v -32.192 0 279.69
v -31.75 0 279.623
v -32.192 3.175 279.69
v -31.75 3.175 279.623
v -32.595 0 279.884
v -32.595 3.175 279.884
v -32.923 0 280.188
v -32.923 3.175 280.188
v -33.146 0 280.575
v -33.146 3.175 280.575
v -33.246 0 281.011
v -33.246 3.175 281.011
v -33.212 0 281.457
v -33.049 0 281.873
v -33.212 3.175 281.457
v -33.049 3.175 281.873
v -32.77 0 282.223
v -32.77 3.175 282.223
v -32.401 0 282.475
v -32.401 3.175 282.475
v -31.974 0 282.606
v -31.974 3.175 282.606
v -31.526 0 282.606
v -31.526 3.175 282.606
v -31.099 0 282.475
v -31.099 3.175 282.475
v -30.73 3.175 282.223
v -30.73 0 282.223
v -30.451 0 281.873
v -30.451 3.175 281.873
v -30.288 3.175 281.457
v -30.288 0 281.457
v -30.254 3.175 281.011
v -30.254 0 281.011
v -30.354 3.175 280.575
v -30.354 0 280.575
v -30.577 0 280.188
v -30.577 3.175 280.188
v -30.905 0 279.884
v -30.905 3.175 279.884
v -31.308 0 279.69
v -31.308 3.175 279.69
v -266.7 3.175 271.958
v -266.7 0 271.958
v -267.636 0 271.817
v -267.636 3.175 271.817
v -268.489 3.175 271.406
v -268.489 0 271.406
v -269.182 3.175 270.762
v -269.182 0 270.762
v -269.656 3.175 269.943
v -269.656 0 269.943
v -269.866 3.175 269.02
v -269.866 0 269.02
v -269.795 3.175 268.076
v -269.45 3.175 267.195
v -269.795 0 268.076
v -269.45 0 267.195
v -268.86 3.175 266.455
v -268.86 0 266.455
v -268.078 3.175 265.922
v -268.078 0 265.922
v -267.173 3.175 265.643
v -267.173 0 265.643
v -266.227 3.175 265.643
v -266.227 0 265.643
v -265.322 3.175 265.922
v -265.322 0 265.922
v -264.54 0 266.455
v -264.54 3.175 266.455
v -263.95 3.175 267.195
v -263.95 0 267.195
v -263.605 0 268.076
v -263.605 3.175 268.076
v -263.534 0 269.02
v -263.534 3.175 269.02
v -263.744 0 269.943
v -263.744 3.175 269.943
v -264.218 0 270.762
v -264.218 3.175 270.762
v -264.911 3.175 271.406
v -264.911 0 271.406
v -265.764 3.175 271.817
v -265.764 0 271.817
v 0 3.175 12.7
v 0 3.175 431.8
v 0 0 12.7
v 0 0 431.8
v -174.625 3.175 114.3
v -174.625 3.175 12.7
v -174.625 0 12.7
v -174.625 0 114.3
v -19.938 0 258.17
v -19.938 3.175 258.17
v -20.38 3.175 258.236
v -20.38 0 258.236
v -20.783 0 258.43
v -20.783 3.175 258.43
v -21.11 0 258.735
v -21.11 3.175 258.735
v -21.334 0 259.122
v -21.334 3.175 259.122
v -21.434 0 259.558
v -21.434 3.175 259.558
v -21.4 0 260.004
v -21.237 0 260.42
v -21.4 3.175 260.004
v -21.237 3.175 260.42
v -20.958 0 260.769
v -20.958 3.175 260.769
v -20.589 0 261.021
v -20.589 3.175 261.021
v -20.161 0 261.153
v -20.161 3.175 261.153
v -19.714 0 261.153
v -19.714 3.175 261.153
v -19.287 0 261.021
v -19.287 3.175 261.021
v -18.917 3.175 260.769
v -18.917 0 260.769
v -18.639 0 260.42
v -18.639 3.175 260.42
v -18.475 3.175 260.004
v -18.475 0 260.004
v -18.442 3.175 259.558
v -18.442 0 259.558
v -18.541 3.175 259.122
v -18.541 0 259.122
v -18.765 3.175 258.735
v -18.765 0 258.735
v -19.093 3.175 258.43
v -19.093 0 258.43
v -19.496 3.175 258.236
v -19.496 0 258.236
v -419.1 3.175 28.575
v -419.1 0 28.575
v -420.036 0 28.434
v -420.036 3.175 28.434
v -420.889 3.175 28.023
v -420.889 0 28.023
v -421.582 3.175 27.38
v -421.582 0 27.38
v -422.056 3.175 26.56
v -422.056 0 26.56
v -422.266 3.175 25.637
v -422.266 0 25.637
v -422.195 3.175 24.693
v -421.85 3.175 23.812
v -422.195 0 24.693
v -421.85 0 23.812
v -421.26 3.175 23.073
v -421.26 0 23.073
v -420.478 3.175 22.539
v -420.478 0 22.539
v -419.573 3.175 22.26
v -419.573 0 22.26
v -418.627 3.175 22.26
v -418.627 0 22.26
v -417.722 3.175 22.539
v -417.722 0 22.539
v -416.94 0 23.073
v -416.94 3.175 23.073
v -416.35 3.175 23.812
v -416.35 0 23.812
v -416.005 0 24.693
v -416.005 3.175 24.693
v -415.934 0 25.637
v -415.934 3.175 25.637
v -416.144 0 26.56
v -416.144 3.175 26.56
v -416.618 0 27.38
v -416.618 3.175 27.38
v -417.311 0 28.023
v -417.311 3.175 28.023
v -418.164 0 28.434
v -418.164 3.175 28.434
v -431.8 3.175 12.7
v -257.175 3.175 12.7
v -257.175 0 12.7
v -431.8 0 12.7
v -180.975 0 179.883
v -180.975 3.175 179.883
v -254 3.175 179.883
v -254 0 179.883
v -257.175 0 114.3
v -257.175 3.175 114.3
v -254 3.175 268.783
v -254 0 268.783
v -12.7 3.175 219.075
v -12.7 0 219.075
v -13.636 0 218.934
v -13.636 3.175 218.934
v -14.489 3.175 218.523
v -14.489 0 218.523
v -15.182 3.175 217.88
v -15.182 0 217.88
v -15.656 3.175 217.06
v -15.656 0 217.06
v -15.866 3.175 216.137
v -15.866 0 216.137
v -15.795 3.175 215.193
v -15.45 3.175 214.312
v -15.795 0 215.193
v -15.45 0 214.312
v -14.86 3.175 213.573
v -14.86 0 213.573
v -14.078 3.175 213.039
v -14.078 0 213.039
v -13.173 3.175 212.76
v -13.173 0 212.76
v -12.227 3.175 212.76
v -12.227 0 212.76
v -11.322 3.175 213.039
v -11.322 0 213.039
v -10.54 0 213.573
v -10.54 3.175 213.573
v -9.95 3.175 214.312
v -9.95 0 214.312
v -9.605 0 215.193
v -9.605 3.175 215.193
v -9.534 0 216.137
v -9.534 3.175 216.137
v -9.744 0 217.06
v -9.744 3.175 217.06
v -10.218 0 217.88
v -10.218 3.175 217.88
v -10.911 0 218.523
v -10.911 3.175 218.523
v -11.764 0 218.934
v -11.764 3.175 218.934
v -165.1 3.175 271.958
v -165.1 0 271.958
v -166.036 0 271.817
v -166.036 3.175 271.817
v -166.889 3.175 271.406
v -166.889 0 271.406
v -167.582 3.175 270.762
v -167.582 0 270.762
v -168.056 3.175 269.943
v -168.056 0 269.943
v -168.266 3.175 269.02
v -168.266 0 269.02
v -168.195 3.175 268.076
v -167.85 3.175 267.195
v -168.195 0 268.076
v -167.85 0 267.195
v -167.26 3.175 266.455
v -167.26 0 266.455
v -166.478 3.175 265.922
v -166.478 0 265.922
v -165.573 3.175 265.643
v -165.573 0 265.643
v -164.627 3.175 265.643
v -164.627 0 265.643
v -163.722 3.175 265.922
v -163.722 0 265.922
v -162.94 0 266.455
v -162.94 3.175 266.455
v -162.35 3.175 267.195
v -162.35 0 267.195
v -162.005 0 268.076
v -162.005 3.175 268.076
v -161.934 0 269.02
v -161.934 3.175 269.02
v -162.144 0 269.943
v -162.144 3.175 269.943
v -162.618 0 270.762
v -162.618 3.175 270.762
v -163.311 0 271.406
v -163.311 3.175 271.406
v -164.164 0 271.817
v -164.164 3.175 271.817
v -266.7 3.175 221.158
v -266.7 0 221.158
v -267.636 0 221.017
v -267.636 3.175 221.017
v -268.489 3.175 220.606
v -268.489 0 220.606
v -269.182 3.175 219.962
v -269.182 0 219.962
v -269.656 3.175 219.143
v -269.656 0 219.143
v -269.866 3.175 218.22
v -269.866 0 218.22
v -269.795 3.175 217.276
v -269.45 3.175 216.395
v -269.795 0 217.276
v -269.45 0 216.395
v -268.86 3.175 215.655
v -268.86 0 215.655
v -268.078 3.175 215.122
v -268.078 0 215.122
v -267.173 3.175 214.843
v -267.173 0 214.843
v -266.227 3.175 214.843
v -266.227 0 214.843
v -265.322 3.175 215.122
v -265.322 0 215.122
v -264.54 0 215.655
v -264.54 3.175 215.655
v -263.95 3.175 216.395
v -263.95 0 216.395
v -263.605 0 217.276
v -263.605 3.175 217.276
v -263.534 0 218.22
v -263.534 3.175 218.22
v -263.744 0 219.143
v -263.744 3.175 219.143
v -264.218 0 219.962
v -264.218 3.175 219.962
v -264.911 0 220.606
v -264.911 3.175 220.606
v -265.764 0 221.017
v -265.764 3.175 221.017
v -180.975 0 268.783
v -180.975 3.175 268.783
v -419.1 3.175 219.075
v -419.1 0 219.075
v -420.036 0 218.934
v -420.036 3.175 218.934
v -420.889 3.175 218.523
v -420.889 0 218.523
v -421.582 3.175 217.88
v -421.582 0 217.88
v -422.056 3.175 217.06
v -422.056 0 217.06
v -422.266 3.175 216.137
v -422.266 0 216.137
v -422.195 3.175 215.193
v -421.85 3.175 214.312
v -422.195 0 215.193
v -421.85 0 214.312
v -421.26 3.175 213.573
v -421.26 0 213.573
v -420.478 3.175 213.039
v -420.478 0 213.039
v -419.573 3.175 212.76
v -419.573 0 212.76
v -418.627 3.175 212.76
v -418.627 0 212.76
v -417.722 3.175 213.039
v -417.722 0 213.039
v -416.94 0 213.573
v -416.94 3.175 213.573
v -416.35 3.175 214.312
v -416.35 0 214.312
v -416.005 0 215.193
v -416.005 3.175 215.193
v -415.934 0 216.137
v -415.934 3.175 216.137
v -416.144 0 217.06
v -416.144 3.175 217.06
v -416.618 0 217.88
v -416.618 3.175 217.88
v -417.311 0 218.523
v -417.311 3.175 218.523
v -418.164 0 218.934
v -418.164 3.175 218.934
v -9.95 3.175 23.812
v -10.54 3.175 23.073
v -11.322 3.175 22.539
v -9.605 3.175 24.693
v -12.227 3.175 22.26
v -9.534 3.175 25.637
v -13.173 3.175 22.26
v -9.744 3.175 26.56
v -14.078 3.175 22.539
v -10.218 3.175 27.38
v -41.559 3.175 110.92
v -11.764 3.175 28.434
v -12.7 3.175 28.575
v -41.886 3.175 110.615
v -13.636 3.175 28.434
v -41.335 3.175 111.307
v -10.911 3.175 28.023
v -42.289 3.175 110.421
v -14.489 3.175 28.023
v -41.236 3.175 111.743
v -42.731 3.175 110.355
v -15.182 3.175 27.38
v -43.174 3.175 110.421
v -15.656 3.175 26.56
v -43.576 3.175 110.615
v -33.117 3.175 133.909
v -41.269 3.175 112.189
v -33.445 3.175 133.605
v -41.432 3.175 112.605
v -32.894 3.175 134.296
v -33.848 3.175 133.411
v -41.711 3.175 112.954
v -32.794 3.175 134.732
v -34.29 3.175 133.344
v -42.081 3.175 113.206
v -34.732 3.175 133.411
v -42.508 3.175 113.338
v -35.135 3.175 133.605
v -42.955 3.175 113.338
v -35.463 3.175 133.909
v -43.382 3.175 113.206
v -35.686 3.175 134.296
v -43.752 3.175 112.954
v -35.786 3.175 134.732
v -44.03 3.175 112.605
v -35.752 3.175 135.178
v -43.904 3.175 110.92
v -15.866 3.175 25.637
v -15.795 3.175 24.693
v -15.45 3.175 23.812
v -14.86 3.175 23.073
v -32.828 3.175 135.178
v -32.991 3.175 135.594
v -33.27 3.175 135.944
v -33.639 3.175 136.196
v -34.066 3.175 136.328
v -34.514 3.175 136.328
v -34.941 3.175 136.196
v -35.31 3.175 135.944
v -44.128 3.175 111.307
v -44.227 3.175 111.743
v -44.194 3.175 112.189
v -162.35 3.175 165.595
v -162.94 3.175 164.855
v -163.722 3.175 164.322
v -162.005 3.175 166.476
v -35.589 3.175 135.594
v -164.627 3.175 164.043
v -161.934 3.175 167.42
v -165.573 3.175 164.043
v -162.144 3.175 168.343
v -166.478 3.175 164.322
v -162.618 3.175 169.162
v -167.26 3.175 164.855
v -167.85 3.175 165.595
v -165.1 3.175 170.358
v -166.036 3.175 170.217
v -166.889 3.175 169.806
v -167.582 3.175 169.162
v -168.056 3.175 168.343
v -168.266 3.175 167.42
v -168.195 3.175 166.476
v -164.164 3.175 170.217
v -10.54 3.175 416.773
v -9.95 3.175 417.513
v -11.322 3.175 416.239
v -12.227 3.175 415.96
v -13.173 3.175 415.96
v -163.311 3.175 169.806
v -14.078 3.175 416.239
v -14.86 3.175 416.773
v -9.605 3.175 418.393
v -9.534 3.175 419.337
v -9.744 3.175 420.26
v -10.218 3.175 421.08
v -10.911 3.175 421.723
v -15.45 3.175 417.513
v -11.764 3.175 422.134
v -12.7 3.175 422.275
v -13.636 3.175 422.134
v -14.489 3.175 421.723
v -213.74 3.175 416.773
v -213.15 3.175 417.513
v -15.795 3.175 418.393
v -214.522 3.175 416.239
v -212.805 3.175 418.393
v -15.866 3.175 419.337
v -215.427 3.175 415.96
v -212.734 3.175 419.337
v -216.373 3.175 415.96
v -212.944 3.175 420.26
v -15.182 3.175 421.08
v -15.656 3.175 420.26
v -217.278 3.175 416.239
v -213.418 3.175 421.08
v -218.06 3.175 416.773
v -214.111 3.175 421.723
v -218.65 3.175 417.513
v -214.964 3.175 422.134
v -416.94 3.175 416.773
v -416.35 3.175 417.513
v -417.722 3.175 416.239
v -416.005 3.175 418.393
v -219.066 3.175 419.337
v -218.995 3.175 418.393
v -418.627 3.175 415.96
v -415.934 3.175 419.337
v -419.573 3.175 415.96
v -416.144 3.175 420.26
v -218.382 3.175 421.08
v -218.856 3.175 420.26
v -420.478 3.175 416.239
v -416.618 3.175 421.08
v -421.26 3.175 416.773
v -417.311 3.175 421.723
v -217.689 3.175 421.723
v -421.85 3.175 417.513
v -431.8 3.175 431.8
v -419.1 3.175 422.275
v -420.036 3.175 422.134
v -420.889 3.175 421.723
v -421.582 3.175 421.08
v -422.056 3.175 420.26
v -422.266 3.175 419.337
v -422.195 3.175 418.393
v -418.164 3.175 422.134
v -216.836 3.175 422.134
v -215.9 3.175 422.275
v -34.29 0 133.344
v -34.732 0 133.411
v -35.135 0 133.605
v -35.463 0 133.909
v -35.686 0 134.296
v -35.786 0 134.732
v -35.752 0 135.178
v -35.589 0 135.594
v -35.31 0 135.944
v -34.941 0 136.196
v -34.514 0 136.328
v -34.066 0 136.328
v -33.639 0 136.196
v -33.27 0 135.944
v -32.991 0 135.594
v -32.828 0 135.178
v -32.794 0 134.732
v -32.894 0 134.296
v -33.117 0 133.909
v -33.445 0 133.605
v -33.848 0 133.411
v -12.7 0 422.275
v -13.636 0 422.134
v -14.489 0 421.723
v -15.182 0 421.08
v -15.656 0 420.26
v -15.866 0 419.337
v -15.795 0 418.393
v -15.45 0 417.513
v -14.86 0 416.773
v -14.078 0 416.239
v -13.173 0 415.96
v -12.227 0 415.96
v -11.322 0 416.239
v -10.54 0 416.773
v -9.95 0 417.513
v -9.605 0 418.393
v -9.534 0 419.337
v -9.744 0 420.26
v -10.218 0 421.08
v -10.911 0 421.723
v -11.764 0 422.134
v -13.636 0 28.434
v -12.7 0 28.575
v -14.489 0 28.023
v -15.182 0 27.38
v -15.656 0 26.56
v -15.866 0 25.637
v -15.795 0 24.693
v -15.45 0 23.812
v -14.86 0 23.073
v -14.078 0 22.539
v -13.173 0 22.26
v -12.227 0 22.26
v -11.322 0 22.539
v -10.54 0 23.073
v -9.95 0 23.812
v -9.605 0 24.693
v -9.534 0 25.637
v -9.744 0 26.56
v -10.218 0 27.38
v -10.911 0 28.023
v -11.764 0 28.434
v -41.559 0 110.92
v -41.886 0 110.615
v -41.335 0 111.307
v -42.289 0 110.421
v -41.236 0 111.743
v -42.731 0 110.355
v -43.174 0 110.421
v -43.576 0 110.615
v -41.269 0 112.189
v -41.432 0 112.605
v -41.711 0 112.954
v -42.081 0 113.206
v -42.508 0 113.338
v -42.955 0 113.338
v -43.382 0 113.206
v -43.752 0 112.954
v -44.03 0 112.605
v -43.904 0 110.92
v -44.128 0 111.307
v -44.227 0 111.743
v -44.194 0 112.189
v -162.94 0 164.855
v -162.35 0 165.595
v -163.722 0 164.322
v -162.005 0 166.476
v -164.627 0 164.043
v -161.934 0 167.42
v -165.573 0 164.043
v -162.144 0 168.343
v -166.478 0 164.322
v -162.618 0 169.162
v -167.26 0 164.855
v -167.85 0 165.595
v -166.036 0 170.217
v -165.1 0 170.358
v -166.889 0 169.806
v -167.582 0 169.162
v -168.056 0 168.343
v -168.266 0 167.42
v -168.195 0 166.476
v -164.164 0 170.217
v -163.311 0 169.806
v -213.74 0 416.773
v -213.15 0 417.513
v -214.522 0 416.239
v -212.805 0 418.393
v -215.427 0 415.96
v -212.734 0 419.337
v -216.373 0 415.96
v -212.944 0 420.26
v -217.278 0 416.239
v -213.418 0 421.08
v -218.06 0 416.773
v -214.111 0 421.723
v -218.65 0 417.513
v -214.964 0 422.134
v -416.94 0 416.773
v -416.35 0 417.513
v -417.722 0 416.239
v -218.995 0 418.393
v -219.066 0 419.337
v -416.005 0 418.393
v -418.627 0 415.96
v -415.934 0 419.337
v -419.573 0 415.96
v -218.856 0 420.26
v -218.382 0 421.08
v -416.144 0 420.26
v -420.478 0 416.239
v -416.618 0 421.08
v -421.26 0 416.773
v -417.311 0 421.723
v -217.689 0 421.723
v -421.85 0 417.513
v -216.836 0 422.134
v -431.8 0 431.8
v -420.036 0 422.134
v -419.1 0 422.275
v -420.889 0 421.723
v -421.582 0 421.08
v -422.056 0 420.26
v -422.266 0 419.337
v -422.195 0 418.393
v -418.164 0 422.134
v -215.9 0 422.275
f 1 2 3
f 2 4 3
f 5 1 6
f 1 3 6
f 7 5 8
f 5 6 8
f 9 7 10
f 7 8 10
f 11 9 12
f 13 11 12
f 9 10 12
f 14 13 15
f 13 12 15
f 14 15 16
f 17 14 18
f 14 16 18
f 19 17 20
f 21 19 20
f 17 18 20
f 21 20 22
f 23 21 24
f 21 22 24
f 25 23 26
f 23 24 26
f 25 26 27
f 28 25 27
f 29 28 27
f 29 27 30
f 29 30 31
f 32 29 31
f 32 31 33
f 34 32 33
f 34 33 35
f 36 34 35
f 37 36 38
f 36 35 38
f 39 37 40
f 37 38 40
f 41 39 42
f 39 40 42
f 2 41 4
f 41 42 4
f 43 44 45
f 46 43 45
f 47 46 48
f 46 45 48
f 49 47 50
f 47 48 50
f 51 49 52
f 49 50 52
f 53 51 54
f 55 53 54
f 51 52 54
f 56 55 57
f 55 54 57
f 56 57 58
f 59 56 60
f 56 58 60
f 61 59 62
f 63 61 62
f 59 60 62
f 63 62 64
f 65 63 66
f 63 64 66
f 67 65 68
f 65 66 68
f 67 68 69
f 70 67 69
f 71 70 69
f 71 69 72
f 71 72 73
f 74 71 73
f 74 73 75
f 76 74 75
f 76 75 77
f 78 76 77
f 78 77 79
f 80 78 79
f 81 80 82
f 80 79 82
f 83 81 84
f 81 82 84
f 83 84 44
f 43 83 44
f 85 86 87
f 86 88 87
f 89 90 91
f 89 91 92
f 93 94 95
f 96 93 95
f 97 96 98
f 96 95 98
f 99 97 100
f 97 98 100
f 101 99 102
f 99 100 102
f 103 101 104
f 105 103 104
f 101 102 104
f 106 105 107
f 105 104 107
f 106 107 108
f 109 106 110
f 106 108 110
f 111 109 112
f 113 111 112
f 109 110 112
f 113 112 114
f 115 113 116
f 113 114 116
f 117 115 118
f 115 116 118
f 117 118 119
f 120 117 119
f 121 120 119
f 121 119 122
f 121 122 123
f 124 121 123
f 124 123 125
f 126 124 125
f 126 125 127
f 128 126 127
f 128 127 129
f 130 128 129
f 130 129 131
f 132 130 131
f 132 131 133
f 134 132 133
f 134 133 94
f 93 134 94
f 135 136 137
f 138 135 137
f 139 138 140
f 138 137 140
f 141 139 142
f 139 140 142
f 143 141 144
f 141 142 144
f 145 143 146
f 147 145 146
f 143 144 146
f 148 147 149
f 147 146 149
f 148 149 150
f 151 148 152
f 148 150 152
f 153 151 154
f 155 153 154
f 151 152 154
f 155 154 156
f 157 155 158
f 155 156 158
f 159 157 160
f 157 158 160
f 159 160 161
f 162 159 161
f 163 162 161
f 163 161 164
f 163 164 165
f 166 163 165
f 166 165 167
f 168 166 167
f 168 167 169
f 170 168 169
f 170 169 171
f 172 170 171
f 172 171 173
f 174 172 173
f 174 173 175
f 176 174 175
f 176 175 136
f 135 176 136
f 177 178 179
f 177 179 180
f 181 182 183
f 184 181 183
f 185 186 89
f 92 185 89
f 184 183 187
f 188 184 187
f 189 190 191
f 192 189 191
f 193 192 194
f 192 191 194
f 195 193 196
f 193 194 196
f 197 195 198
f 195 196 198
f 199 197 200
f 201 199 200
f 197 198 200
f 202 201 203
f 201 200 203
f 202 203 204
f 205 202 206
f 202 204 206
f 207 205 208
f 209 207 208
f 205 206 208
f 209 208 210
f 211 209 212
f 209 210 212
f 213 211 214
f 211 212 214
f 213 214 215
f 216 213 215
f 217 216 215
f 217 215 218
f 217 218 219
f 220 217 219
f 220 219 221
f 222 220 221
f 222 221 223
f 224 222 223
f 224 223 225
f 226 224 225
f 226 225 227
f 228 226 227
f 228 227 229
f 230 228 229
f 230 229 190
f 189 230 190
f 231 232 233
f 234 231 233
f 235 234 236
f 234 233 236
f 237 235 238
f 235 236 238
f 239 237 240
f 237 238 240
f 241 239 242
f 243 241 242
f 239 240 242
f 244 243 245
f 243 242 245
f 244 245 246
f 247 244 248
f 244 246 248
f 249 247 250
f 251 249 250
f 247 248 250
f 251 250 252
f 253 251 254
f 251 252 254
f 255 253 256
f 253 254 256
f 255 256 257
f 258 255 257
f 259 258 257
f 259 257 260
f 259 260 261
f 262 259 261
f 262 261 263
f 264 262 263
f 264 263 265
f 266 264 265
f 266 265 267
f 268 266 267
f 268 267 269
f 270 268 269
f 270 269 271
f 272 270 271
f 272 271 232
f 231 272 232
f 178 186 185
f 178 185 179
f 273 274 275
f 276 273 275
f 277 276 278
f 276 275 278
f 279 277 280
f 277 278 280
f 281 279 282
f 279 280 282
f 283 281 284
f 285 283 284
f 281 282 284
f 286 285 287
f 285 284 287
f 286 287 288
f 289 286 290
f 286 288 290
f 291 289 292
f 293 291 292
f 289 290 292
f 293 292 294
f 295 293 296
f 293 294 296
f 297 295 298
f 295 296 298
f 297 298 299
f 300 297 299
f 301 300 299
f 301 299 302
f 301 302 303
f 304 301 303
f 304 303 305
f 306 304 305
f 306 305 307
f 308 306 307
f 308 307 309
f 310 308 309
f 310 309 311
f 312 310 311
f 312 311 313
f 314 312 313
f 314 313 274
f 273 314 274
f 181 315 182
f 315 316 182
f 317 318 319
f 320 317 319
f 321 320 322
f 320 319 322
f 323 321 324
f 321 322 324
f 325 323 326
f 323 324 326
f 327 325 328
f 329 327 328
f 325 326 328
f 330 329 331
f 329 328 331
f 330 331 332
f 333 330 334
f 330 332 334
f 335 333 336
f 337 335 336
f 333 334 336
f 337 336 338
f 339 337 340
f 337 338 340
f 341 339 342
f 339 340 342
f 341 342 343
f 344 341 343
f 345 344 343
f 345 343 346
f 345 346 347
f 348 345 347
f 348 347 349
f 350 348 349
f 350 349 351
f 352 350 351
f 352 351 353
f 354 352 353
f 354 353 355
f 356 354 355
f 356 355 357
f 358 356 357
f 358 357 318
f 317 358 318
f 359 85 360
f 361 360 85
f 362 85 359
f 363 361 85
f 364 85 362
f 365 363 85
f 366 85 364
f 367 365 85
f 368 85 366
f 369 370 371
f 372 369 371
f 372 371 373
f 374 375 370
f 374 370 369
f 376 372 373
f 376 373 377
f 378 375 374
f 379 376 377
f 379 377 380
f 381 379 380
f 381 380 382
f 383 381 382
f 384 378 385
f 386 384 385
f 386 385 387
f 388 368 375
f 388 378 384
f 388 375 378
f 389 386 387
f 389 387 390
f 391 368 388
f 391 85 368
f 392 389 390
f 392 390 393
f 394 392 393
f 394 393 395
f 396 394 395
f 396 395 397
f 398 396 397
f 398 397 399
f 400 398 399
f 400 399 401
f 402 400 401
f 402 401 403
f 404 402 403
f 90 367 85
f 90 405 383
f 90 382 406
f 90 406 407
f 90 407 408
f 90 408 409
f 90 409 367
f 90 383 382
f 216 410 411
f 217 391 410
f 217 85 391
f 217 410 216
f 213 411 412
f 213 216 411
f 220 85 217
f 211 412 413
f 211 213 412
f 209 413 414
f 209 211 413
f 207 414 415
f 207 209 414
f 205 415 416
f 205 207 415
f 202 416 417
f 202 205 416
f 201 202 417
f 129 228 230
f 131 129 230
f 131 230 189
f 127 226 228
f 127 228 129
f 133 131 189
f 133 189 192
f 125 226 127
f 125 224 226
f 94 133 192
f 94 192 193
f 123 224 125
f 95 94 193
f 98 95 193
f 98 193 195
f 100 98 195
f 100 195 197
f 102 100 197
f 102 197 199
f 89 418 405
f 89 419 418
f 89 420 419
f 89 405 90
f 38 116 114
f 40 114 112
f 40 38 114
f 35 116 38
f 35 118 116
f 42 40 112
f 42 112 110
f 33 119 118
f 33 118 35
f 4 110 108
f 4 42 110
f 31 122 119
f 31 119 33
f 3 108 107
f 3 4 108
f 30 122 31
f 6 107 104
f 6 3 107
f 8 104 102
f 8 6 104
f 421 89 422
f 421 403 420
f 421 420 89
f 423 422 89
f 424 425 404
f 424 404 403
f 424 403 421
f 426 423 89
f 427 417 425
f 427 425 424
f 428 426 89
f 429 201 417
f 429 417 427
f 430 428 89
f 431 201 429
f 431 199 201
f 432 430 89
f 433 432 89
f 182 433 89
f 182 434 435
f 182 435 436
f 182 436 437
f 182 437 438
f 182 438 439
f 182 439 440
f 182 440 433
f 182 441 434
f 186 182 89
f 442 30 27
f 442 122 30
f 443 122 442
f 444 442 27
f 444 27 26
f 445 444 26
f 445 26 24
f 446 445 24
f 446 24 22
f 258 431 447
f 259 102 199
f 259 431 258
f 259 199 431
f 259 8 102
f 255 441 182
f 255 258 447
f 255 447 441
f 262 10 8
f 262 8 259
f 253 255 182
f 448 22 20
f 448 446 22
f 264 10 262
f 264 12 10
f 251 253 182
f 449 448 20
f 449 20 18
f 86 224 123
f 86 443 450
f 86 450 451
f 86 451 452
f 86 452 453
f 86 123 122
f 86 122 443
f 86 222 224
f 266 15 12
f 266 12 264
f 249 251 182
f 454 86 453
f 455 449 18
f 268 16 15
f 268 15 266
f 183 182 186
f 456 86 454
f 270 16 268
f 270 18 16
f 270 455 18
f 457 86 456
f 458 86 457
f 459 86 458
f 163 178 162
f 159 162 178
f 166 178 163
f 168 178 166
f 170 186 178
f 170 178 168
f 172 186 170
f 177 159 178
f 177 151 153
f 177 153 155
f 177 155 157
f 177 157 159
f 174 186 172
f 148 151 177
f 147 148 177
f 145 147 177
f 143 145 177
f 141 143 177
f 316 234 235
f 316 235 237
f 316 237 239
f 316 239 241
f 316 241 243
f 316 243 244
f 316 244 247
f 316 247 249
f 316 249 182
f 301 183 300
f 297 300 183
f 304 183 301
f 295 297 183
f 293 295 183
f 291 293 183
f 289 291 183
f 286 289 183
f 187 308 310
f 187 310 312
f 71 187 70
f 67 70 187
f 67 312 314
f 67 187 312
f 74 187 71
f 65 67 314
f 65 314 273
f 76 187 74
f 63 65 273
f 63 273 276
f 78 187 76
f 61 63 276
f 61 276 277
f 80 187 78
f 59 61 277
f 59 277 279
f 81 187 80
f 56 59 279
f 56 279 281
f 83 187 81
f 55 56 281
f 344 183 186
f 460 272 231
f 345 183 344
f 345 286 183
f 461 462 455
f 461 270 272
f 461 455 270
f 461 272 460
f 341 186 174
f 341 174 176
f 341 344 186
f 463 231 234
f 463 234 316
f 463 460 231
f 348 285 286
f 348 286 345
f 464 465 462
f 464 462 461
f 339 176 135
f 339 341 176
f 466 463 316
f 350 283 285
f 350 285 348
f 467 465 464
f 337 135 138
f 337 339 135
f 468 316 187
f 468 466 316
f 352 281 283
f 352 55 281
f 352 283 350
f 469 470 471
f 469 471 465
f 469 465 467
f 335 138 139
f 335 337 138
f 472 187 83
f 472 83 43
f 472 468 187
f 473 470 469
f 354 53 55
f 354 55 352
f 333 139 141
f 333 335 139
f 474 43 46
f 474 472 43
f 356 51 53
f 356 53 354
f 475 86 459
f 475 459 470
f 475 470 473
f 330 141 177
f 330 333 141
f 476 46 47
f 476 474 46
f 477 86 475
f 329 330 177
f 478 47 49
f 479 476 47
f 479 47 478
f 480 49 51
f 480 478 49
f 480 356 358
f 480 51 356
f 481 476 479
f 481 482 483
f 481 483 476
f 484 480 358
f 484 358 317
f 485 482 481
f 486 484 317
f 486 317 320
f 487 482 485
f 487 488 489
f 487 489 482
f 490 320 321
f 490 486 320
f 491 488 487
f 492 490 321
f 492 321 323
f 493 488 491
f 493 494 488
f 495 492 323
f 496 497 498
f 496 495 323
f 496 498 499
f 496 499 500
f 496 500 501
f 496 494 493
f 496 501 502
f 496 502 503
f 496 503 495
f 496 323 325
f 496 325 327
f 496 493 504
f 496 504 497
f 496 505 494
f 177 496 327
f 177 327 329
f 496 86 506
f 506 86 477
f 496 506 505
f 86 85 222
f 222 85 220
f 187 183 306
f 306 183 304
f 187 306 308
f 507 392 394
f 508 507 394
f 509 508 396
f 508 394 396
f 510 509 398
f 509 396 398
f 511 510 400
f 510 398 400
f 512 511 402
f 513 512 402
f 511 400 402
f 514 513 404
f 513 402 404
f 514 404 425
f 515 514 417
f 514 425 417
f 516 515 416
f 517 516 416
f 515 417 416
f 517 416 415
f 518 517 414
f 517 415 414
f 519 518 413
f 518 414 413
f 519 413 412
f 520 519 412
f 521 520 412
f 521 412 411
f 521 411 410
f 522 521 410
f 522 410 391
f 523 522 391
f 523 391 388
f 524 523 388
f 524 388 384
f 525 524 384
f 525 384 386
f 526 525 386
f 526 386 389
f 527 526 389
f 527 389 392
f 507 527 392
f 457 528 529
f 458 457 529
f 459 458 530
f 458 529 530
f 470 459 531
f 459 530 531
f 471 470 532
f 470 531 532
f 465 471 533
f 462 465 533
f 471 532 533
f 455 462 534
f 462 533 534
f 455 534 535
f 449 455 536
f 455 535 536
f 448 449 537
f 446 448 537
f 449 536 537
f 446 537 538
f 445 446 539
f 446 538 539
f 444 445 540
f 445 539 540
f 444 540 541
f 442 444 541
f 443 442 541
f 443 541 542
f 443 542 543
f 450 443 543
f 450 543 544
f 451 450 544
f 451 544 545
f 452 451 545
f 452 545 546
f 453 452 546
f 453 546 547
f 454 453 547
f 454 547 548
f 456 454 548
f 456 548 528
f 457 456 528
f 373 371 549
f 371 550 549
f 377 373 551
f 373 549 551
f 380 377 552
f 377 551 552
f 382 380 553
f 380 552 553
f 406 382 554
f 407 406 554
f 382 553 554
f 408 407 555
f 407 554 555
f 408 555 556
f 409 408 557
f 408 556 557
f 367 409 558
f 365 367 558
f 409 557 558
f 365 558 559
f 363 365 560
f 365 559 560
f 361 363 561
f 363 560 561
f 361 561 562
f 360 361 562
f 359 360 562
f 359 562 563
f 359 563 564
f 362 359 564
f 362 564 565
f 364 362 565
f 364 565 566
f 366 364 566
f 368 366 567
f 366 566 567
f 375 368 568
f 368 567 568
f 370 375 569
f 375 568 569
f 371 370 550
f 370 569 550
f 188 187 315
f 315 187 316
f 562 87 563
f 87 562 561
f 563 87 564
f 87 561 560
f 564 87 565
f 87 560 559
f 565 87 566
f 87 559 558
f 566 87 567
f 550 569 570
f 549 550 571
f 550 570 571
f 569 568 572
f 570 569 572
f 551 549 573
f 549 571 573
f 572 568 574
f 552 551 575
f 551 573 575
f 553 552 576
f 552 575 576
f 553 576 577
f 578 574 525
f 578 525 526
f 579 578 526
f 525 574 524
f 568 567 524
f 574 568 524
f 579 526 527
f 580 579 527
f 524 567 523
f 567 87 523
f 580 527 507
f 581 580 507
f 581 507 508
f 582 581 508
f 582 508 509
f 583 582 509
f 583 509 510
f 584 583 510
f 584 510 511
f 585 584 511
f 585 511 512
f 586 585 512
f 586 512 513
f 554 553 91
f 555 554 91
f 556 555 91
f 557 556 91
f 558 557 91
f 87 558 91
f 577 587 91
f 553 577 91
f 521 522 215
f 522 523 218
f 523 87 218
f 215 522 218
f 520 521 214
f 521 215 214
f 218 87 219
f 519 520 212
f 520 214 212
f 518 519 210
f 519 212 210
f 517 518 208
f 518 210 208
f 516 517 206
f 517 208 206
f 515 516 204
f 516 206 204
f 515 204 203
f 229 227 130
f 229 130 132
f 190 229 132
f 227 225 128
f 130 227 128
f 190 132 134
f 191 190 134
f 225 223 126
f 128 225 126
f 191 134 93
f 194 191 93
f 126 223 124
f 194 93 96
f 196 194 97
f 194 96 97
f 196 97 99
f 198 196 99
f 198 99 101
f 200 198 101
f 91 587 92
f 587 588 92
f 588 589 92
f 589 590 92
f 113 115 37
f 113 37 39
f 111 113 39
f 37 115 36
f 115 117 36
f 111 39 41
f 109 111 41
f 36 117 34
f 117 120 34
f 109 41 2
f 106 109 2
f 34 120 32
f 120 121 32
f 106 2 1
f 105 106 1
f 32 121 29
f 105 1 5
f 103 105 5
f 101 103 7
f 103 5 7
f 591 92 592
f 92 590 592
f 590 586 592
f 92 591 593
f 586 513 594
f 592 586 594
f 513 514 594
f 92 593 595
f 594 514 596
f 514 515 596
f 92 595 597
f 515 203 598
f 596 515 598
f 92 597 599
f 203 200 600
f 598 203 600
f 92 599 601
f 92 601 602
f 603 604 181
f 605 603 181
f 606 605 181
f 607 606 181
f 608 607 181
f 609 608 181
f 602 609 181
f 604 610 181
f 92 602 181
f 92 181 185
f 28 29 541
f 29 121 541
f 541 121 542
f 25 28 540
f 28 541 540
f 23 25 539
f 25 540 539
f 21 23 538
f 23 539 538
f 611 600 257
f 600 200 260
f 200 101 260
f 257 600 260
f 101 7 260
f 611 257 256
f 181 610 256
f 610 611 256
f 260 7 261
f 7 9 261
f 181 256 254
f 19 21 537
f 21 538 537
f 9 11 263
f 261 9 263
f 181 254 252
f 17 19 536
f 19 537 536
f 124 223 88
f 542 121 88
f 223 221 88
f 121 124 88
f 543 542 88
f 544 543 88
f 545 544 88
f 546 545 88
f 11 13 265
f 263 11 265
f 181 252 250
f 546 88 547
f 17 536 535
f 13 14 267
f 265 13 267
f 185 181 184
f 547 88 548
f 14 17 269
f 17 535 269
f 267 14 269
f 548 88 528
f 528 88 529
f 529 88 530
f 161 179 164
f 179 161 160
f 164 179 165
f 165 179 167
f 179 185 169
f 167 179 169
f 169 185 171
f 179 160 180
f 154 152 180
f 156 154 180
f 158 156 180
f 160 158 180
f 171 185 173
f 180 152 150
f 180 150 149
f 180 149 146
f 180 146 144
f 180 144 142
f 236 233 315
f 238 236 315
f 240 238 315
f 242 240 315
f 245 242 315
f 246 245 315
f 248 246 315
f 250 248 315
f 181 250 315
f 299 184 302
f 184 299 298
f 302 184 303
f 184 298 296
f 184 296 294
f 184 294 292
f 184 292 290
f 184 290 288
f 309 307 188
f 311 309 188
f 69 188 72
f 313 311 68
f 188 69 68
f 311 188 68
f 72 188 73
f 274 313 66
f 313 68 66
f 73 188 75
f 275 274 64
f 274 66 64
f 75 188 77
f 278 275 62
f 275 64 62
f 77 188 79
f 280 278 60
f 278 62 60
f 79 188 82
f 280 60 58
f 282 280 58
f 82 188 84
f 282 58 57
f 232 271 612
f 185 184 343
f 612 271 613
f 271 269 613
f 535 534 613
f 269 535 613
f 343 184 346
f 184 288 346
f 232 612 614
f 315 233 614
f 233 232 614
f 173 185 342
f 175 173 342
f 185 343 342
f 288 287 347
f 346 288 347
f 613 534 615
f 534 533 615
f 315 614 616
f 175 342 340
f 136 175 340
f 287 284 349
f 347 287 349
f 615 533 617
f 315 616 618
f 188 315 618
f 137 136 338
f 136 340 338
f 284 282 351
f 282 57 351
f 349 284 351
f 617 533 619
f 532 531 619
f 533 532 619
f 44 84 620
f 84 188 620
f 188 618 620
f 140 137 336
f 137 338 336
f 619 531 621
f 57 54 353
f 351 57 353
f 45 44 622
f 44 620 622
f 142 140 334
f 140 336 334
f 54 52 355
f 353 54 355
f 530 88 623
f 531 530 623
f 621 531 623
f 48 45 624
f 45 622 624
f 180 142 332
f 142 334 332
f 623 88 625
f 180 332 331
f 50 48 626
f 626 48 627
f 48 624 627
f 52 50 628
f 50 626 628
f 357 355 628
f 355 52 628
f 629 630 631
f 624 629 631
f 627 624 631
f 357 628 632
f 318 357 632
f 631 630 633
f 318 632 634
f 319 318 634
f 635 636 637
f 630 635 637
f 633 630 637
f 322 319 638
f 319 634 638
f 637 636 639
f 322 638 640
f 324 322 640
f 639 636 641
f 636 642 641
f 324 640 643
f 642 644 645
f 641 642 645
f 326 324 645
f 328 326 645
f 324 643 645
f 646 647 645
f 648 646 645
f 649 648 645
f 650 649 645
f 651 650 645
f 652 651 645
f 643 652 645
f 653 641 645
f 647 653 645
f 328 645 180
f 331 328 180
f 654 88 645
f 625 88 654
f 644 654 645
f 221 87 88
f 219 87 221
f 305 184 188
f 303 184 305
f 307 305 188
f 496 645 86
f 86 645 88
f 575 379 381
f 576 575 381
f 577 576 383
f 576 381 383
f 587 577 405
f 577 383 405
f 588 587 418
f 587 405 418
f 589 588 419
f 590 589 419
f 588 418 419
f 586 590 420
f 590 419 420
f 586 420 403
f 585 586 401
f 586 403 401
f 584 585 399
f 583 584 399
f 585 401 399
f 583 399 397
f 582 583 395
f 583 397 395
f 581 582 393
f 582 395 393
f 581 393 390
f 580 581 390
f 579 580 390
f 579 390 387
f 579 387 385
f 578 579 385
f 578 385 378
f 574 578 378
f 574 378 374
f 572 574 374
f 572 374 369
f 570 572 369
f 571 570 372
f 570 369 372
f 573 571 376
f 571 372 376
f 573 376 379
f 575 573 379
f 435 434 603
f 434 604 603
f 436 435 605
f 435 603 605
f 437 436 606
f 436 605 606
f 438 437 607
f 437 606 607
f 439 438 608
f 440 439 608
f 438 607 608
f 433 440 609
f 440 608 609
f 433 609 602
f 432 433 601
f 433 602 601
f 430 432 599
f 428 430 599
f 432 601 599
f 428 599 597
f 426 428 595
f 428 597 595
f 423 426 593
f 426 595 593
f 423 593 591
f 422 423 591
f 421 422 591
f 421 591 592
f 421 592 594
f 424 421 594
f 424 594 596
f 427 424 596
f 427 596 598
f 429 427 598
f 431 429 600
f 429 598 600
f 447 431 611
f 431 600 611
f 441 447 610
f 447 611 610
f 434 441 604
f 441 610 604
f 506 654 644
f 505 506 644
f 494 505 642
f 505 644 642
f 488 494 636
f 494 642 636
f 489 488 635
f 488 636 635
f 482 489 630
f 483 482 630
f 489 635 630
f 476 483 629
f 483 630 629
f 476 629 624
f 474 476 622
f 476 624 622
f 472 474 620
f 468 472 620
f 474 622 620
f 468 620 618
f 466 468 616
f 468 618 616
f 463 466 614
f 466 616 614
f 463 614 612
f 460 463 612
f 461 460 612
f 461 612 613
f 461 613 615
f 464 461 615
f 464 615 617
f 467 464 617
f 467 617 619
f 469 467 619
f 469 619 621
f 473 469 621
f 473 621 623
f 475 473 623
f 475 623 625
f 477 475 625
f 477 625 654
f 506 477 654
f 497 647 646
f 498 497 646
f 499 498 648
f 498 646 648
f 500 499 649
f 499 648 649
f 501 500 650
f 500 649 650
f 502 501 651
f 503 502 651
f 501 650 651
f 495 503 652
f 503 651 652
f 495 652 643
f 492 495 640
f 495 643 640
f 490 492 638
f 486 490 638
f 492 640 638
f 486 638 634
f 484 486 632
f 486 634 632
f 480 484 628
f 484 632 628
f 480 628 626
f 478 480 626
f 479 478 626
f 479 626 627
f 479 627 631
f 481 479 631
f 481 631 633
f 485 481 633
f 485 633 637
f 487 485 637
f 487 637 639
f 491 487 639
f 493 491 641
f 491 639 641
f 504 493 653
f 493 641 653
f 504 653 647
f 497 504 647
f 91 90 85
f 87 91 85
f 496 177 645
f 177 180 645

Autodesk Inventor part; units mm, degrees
ref_plane "YZ Plane" through (0, 0, 0) normal (1, 0, 0) x (0, 1, 0)
ref_plane "XZ Plane" through (0, 0, 0) normal (0, 1, 0) x (-1, 0, 0)
ref_plane "XY Plane" through (0, 0, 0) normal (0, 0, 1) x (1, 0, 0)
sketch "Sketch1" plane through (0, 0, 0) normal (0, 1, 0) x (-1, 0, 0)
  line L0 (0, 0) -> (431.8, 0)
  line L1 (431.8, 0) -> (431.8, 431.8)
  line L2 (431.8, 431.8) -> (0, 431.8)
  line L3 (0, 431.8) -> (0, 0)
  dimension "d0" = 431.8
  dimension "d2" = 431.8
extrude "Extrusion1" add sketch "Sketch1" along normal blind 3.175
sketch "Sketch2" plane through (0, 3.175, 0) normal (0, 1, 0) x (1, 0, 0)
  line L0 (0, 0) -> (-431.8, 0) projected
  line L1 (-431.8, 0) -> (-431.8, -431.8) projected
  line L2 (-431.8, -431.8) -> (0, -431.8) projected
  line L3 (0, -431.8) -> (0, 0) projected
  line L4 (-257.175, -114.3) -> (-174.625, -114.3)
  line L5 (-174.625, -114.3) -> (-174.625, -19.05)
  line L6 (-257.175, -31.75) -> (-257.175, -114.3)
  line L7 (0, -215.9) -> (-431.8, -215.9)
  line L8 (-174.625, 0) -> (-174.625, -19.05)
  line L9 (-257.175, -31.75) -> (-257.175, 0)
  line L10 (-215.9, -431.8) -> (-215.9, -215.9)
  dimension "d5" = 82.55
  dimension "d7" = 82.55
  dimension "d8" = 215.9
  dimension "d9" = 101.6
  dimension "d10" = 41.275
  dimension "d51" = 174.625
  dimension "d52" = 174.625
extrude "Extrusion2" cut sketch "Sketch2" against normal blind 3.175 contours L8 L5 L4 L6 L9 L0
sketch "Sketch3" plane through (0, 3.175, 0) normal (0, 1, 0) x (1, 0, 0)
  line L0 (-431.8, 0) -> (-431.8, -431.8) projected
  line L1 (-431.8, -431.8) -> (0, -431.8) projected
  line L2 (-266.7, -268.7828) -> (-165.1, -268.7828)
  line L3 (-165.1, -268.7828) -> (-165.1, -167.1828)
  line L4 (-165.1, -167.1828) -> (-266.7, -167.1828)
  line L5 (-266.7, -167.1828) -> (-266.7, -268.7828)
  line L6 (-215.9, -167.1828) -> (-215.9, -268.7828)
  line L7 (-165.1, -217.9828) -> (-266.7, -217.9828)
  line L8 (0, -431.8) -> (0, 0) projected
  dimension "d13" = 101.6
  dimension "d15" = 101.6
  dimension "d18" = 215.9
  dimension "d19" = 213.8172
  dimension "d55" = 50.8
  dimension "d56" = 50.8
  dimension "d57" = 215.9
hole "Hole1" at (-165.1, 3.175, 167.1828) at (-266.7, 3.175, 217.9828) at (-266.7, 3.175, 268.7828) at (-165.1, 3.175, 268.7828) direction (0, -1, 0) diameter 6.35 end through all
sketch "Sketch4" plane through (0, 3.175, 0) normal (0, 1, 0) x (1, 0, 0)
  circle A0 centre (-165.1, -167.1828) radius 3.175 projected
  circle A1 centre (-266.7, -217.9828) radius 3.175 projected
  circle A2 centre (-165.1, -268.7828) radius 3.175 projected
  line L0 (-254, -268.7828) -> (-180.975, -268.7828)
  line L1 (-180.975, -268.7828) -> (-180.975, -179.8828)
  line L2 (-180.975, -179.8828) -> (-254, -179.8828)
  line L3 (-254, -179.8828) -> (-254, -268.7828)
  line L4 (-431.8, 0) -> (-431.8, -431.8) projected
  line L5 (0, -431.8) -> (0, 0) projected
  dimension "d27" = 12.7
  dimension "d28" = 12.7
  dimension "d29" = 12.7
  dimension "d30" = 88.9
  dimension "d53" = 177.8
  dimension "d54" = 180.975
extrude "Extrusion3" cut sketch "Sketch4" against normal blind 3.175 contours L3 L2 L1 L0
sketch "Sketch5" plane through (0, 3.175, 0) normal (0, 1, 0) x (1, 0, 0)
  line L0 (-431.8, 0) -> (-431.8, -431.8) projected
  line L1 (-431.8, -431.8) -> (0, -431.8) projected
  line L2 (0, -431.8) -> (0, 0) projected
  point P0 (-419.1, -215.9)
  point P1 (-215.9, -419.1)
  point P2 (-12.7, -215.9)
  dimension "d33" = 12.7
  dimension "d34" = 12.7
  dimension "d35" = 12.7
  dimension "d36" = 215.9
  dimension "d37" = 215.9
  dimension "d38" = 215.9
hole "Hole2" at (-419.1, 3.175, 215.9) at (-215.9, 3.175, 419.1) at (-12.7, 3.175, 215.9) direction (0, -1, 0) diameter 6.35 end through all
sketch "Sketch6" plane through (0, 3.175, 0) normal (0, 1, 0) x (1, 0, 0)
  line L0 (0, -431.8) -> (0, 0) projected
  line L1 (0, 0) -> (-174.625, 0) projected
  line L2 (-174.625, 0) -> (-174.625, -114.3) projected
  line L3 (-174.625, -12.7) -> (0, -12.7)
  dimension "d46" = 12.7
extrude "Extrusion4" cut sketch "Sketch6" against normal blind 25.4
sketch "Sketch7" plane through (0, 3.175, 0) normal (0, 1, 0) x (1, 0, 0)
  line L0 (-257.175, -114.3) -> (-257.175, 0) projected
  line L1 (-257.175, 0) -> (-431.8, 0) projected
  line L2 (-431.8, 0) -> (-431.8, -431.8) projected
  line L3 (-257.175, -12.7) -> (-431.8, -12.7)
  point P0 (0, 0)
  dimension "d58" = 12.7
extrude "Extrusion5" cut sketch "Sketch7" against normal blind 25.4
sketch "Sketch8" plane through (0, 3.175, 0) normal (0, 1, 0) x (1, 0, 0)
  line L0 (-257.175, -12.7) -> (-431.8, -12.7) projected
  line L1 (-431.8, -12.7) -> (-431.8, -431.8) projected
  line L2 (-431.8, -431.8) -> (0, -431.8) projected
  line L3 (0, -431.8) -> (0, -12.7) projected
  line L4 (0, -12.7) -> (-174.625, -12.7) projected
  point P0 (0, 0)
  point P1 (-419.1, -25.4)
  point P2 (-12.7, -25.4)
  point P3 (-419.1, -419.1)
  point P4 (-12.7, -419.1)
  dimension "d59" = 12.7
  dimension "d60" = 12.7
  dimension "d61" = 12.7
  dimension "d62" = 12.7
  dimension "d63" = 12.7
  dimension "d64" = 12.7
  dimension "d65" = 12.7
  dimension "d66" = 12.7
hole "Hole3" at (-419.1, 3.175, 25.4) at (-12.7, 3.175, 25.4) at (-419.1, 3.175, 419.1) at (-12.7, 3.175, 419.1) direction (0, -1, 0) diameter 6.35 end through all
sketch "Sketch9" plane through (0, 0, 0) normal (0, -1, 0) x (1, 0, 0)
  line L0 (0, 431.8) -> (0, 12.7) projected
  point P0 (0, 0)
  point P1 (-34.29, 134.8443)
  dimension "d74" = 34.29
hole "Hole4" at (-34.29, 0, 134.8443) direction (0, 1, 0) diameter 3 end through all
sketch "Sketch10" plane through (0, 0, 0) normal (0, -1, 0) x (1, 0, 0)
  line L0 (0, 431.8) -> (0, 12.7) projected
  point P0 (0, 0)
  point P1 (-31.75, 281.1231)
  dimension "d82" = 31.75
hole "Hole5" at (-31.75, 0, 281.1231) direction (0, 1, 0) diameter 3 end through all
sketch "Sketch12" plane through (0, 0, 0) normal (0, -1, 0) x (1, 0, 0)
  circle A0 centre (-34.29, 134.8443) radius 1.5 projected
  line L0 (0, 431.8) -> (0, 12.7) projected
  line L1 (-34.29, 134.8443) -> (-50.0054, 119.1289)
  line L2 (-50.0054, 119.1289) -> (-42.7314, 111.8548)
  point P0 (0, 0)
  dimension "d108" = 45
  dimension "d109" = 22.225
  dimension "d110" = 10.287
hole "Hole7" at (-42.7314, 0, 111.8548) direction (0, 1, 0) diameter 3 depth 25.4 tip angle 118
sketch "Sketch13" plane through (0, 0, 0) normal (0, -1, 0) x (1, 0, 0)
  circle A0 centre (-31.75, 281.1231) radius 1.5 projected
  line L0 (0, 431.8) -> (0, 12.7) projected
  line L1 (-31.75, 281.1231) -> (-30.1997, 258.9522)
  line L2 (-30.1997, 258.9522) -> (-19.9377, 259.6698)
  point P0 (0, 0)
  dimension "d118" = 4
  dimension "d119" = 22.225
  dimension "d120" = 10.287
hole "Hole8" at (-19.9377, 0, 259.6698) direction (0, 1, 0) diameter 3 depth 25.4 tip angle 118
properties part number "New BottomHopper Plate" material "Aluminum 6061"
